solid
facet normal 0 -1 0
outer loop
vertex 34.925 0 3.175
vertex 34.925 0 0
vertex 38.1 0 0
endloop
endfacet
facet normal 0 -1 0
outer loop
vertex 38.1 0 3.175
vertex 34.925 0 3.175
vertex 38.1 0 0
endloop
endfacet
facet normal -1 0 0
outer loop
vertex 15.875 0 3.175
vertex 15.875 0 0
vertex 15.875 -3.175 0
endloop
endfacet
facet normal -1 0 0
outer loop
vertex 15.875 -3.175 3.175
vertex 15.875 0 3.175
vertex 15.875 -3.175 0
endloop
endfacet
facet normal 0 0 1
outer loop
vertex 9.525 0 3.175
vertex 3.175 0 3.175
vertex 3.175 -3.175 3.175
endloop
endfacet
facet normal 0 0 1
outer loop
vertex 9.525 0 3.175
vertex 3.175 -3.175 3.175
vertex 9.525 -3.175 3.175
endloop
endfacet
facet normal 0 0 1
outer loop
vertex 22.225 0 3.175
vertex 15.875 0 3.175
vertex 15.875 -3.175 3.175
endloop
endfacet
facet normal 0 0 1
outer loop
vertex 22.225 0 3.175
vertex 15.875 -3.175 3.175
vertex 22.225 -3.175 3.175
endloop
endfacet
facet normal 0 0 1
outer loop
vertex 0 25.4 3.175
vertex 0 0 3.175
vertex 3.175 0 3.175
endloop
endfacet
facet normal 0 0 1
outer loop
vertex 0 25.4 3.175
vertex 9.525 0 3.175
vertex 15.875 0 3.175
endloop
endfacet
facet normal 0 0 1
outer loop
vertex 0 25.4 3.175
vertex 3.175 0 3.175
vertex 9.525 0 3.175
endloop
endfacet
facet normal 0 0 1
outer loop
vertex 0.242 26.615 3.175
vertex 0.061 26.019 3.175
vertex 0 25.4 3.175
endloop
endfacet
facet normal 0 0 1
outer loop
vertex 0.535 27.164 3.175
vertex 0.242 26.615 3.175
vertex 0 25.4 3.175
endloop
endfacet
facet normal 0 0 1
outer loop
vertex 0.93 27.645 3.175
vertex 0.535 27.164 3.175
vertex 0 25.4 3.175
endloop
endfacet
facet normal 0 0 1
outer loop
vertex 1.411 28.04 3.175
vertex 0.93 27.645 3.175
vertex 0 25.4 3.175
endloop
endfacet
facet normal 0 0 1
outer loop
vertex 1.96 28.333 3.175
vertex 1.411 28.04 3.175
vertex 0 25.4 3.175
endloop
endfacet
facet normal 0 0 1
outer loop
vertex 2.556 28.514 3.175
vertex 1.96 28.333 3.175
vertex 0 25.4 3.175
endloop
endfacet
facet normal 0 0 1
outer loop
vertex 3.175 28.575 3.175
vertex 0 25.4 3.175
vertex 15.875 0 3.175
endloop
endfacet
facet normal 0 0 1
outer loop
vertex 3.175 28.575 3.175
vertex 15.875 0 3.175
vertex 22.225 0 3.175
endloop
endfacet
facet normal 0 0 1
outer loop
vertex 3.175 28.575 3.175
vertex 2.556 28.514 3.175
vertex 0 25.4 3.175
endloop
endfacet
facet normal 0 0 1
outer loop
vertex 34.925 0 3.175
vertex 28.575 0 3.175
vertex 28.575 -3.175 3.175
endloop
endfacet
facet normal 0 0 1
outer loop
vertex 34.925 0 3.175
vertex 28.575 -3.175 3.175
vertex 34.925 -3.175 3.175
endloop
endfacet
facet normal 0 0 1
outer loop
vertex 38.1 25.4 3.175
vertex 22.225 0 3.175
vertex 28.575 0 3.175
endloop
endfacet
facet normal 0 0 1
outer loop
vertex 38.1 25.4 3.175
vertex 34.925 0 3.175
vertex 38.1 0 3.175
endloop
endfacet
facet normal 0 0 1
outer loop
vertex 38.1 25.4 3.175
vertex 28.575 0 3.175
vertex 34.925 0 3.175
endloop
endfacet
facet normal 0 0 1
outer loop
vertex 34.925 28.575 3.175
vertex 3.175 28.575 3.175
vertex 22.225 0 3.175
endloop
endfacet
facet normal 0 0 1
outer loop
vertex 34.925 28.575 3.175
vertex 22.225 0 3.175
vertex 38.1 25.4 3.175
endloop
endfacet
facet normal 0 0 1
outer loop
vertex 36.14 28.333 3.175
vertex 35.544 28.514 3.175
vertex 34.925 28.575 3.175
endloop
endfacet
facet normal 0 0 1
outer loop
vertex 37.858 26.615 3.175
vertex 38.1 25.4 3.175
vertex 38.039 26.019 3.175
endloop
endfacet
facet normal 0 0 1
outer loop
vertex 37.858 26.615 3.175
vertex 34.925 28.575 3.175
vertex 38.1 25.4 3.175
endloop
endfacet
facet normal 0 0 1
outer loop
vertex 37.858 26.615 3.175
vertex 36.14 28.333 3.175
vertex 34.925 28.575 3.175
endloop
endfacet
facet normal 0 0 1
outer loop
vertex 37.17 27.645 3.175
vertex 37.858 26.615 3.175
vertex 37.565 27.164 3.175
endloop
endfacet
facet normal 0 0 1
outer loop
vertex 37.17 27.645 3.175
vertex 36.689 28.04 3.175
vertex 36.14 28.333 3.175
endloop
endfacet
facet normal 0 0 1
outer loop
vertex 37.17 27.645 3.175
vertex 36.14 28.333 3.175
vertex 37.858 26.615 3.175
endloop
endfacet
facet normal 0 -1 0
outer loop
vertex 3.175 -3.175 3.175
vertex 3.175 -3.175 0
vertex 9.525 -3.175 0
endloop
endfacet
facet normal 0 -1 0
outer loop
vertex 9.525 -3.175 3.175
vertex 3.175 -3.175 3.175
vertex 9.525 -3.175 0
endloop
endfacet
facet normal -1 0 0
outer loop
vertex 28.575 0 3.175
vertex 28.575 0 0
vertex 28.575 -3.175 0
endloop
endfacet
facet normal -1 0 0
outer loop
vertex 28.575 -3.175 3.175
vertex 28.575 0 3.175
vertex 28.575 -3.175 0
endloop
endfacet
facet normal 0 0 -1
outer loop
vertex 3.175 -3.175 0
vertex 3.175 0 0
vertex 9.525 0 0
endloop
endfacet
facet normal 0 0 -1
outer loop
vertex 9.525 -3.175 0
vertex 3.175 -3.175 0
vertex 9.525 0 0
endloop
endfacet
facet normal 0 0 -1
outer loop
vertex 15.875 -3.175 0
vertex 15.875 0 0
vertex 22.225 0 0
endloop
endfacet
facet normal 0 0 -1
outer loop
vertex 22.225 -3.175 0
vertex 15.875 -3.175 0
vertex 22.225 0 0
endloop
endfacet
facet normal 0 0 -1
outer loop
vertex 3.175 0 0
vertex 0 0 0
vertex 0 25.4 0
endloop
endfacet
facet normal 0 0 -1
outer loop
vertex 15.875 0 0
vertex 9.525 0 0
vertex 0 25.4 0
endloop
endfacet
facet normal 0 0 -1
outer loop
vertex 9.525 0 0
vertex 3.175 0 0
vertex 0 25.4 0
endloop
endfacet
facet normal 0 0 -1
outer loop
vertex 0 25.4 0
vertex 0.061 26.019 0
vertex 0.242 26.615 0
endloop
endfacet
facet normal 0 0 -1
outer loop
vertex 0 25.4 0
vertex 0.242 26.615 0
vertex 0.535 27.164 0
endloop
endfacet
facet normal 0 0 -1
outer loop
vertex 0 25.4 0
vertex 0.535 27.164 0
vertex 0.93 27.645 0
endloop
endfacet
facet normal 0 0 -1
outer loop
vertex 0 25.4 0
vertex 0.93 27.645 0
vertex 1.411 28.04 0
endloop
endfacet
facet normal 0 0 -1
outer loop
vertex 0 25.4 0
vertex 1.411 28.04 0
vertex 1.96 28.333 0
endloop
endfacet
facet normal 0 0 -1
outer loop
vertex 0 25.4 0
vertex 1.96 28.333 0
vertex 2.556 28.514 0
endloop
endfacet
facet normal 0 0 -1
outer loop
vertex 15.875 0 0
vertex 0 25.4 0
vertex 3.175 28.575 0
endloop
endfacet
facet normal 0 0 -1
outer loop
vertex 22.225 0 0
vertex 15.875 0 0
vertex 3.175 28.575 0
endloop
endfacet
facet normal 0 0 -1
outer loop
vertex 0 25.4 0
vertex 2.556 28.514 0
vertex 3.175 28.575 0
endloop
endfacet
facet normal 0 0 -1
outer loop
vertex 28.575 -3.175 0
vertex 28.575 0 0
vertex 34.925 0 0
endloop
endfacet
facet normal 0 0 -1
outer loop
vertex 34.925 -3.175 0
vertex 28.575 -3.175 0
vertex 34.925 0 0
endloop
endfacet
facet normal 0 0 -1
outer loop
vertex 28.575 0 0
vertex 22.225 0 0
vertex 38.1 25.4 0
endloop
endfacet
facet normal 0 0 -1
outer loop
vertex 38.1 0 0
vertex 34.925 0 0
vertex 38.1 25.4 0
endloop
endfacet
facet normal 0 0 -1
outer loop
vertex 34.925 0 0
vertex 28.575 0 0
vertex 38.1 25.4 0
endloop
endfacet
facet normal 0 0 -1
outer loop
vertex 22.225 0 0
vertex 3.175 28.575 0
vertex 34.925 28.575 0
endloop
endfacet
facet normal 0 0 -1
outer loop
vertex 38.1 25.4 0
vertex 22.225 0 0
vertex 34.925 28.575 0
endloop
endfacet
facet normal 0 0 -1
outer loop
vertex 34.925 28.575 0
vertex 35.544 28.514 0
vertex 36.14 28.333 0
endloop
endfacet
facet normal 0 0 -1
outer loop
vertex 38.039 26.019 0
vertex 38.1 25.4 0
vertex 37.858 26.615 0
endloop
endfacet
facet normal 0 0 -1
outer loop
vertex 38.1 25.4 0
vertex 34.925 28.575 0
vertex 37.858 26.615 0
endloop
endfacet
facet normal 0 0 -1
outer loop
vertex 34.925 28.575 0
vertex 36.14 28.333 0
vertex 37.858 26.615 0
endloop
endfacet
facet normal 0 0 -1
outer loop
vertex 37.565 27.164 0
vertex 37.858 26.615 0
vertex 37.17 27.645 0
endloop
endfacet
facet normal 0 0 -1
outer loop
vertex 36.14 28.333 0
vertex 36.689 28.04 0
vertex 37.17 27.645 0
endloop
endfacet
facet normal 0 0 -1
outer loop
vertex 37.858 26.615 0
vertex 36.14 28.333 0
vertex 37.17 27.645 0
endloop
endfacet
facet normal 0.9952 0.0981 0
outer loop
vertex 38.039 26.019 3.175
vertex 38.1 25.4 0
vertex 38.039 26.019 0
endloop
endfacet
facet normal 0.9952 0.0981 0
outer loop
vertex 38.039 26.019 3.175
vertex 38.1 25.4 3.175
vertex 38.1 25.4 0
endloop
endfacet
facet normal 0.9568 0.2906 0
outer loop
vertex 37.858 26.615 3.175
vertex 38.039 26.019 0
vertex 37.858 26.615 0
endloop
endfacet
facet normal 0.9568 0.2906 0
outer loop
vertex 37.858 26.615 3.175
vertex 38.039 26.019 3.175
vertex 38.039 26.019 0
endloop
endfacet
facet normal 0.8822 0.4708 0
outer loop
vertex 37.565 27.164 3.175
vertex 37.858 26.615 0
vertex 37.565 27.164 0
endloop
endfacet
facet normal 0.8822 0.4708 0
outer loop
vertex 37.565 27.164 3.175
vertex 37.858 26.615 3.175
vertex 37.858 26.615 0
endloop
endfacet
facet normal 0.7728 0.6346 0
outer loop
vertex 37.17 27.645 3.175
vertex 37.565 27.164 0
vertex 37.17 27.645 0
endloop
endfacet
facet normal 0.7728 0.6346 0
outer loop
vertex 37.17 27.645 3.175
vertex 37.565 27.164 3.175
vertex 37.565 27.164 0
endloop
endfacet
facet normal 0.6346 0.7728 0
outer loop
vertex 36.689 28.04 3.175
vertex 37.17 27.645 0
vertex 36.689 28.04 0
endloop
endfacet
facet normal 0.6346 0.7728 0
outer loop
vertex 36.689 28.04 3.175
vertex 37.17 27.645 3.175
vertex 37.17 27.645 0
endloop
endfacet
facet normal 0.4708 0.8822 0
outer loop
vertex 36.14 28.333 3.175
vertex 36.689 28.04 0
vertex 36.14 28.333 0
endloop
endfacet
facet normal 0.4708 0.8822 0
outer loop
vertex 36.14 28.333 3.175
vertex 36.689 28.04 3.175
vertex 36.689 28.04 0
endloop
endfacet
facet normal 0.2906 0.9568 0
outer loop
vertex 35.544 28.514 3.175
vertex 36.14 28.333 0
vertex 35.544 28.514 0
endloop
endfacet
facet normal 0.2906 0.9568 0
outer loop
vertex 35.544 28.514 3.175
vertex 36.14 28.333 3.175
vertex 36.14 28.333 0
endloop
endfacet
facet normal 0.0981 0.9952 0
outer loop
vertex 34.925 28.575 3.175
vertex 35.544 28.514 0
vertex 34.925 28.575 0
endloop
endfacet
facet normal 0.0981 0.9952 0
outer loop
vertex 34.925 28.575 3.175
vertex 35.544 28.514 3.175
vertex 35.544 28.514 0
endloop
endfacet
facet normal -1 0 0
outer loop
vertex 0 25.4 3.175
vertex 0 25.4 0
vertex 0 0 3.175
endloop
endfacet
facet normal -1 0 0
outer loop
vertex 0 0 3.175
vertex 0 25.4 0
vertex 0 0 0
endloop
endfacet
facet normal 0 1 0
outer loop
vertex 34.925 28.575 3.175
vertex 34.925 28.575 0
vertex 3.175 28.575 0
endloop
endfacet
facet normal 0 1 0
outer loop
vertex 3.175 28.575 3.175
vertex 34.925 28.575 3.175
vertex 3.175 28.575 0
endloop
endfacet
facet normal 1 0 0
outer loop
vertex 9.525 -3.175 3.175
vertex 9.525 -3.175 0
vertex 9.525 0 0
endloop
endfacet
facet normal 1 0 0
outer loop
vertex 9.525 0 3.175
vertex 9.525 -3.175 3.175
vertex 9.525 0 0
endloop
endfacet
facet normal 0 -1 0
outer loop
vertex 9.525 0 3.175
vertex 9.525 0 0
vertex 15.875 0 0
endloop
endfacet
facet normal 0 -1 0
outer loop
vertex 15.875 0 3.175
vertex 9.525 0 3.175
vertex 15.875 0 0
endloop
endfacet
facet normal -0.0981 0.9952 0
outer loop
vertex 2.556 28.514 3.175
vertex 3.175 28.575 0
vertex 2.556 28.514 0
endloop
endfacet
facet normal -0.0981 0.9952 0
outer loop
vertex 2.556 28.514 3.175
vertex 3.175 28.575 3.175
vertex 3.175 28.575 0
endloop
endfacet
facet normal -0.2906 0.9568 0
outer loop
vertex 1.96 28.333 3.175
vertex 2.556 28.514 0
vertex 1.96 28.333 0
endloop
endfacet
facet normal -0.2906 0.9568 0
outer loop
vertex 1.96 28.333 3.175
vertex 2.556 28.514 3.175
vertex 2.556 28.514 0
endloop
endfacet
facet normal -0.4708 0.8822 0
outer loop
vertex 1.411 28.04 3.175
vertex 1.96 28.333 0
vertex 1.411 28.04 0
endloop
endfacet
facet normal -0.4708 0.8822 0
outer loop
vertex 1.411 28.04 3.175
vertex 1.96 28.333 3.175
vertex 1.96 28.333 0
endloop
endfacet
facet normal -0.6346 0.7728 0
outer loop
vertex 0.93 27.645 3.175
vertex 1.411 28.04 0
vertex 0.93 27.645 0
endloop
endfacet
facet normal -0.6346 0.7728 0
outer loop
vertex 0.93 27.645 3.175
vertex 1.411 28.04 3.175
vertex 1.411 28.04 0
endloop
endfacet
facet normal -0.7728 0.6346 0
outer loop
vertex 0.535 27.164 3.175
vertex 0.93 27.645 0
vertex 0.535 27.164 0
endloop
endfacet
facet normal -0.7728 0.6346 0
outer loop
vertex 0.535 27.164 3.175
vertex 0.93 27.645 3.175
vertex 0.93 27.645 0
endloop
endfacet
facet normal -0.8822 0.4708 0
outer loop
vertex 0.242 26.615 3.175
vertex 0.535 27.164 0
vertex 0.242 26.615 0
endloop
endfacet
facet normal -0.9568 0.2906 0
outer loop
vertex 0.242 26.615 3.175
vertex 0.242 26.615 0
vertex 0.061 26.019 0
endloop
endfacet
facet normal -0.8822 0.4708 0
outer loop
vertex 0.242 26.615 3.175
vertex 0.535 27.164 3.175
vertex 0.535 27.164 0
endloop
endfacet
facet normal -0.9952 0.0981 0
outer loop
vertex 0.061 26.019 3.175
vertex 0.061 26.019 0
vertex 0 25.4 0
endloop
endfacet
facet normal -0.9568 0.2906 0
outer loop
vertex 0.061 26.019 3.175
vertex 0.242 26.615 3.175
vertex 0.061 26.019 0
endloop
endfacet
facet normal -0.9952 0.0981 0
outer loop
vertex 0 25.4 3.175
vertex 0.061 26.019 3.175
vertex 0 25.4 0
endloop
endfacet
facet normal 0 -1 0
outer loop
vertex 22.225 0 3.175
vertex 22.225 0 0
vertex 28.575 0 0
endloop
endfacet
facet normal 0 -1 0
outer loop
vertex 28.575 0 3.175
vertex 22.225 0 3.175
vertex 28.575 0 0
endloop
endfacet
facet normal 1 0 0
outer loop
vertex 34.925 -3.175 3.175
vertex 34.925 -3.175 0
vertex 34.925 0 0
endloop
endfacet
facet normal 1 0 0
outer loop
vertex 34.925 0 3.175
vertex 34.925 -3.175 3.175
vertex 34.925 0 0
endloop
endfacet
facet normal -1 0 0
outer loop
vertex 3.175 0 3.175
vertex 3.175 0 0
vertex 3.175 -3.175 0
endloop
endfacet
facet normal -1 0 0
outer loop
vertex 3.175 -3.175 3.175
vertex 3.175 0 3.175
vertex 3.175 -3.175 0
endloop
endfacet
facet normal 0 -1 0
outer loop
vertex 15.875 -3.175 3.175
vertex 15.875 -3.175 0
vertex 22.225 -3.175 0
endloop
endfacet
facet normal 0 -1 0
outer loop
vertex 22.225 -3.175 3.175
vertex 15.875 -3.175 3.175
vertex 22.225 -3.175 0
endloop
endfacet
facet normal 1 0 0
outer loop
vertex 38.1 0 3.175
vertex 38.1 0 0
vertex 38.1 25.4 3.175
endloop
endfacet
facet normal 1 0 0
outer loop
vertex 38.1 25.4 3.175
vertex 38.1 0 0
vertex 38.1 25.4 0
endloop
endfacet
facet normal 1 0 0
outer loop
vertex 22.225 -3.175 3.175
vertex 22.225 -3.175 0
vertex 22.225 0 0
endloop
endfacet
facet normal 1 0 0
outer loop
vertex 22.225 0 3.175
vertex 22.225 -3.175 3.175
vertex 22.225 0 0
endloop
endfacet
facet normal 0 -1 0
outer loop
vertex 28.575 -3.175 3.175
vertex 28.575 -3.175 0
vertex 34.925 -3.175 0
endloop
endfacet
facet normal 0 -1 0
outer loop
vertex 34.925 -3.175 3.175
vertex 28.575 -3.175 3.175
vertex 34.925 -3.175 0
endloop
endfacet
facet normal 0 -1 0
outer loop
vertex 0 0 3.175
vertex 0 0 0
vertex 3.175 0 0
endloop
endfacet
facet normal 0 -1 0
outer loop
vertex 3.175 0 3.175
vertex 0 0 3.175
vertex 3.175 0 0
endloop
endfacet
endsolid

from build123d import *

# Parameters (mm, degrees)
BOSS_EXTRUDE1_DEPTH = 3.175
FILLET1_R           = 3.175


with BuildPart() as part:
    # Sketch1 → Boss-Extrude1 (new body)
    with BuildSketch(Plane.XY):
        Polygon((9.525, 0), (15.875, 0), (15.875, -3.175), (22.225, -3.175), (22.225, 0), (28.575, 0), (28.575, -3.175), (34.925, -3.175), (34.925, 0), (38.1, 0), (38.1, 28.575), (0, 28.575), (0, 0), (3.175, 0), (3.175, -3.175), (9.525, -3.175), align=None)
    extrude(amount=BOSS_EXTRUDE1_DEPTH)

    # Fillet1
    fillet1_edges = [part.edges().sort_by_distance(p)[0] for p in [
        (0, 28.575, 1.5875),
        (38.1, 28.575, 1.5875),
    ]]
    fillet(fillet1_edges, radius=FILLET1_R)


solid = part.part
